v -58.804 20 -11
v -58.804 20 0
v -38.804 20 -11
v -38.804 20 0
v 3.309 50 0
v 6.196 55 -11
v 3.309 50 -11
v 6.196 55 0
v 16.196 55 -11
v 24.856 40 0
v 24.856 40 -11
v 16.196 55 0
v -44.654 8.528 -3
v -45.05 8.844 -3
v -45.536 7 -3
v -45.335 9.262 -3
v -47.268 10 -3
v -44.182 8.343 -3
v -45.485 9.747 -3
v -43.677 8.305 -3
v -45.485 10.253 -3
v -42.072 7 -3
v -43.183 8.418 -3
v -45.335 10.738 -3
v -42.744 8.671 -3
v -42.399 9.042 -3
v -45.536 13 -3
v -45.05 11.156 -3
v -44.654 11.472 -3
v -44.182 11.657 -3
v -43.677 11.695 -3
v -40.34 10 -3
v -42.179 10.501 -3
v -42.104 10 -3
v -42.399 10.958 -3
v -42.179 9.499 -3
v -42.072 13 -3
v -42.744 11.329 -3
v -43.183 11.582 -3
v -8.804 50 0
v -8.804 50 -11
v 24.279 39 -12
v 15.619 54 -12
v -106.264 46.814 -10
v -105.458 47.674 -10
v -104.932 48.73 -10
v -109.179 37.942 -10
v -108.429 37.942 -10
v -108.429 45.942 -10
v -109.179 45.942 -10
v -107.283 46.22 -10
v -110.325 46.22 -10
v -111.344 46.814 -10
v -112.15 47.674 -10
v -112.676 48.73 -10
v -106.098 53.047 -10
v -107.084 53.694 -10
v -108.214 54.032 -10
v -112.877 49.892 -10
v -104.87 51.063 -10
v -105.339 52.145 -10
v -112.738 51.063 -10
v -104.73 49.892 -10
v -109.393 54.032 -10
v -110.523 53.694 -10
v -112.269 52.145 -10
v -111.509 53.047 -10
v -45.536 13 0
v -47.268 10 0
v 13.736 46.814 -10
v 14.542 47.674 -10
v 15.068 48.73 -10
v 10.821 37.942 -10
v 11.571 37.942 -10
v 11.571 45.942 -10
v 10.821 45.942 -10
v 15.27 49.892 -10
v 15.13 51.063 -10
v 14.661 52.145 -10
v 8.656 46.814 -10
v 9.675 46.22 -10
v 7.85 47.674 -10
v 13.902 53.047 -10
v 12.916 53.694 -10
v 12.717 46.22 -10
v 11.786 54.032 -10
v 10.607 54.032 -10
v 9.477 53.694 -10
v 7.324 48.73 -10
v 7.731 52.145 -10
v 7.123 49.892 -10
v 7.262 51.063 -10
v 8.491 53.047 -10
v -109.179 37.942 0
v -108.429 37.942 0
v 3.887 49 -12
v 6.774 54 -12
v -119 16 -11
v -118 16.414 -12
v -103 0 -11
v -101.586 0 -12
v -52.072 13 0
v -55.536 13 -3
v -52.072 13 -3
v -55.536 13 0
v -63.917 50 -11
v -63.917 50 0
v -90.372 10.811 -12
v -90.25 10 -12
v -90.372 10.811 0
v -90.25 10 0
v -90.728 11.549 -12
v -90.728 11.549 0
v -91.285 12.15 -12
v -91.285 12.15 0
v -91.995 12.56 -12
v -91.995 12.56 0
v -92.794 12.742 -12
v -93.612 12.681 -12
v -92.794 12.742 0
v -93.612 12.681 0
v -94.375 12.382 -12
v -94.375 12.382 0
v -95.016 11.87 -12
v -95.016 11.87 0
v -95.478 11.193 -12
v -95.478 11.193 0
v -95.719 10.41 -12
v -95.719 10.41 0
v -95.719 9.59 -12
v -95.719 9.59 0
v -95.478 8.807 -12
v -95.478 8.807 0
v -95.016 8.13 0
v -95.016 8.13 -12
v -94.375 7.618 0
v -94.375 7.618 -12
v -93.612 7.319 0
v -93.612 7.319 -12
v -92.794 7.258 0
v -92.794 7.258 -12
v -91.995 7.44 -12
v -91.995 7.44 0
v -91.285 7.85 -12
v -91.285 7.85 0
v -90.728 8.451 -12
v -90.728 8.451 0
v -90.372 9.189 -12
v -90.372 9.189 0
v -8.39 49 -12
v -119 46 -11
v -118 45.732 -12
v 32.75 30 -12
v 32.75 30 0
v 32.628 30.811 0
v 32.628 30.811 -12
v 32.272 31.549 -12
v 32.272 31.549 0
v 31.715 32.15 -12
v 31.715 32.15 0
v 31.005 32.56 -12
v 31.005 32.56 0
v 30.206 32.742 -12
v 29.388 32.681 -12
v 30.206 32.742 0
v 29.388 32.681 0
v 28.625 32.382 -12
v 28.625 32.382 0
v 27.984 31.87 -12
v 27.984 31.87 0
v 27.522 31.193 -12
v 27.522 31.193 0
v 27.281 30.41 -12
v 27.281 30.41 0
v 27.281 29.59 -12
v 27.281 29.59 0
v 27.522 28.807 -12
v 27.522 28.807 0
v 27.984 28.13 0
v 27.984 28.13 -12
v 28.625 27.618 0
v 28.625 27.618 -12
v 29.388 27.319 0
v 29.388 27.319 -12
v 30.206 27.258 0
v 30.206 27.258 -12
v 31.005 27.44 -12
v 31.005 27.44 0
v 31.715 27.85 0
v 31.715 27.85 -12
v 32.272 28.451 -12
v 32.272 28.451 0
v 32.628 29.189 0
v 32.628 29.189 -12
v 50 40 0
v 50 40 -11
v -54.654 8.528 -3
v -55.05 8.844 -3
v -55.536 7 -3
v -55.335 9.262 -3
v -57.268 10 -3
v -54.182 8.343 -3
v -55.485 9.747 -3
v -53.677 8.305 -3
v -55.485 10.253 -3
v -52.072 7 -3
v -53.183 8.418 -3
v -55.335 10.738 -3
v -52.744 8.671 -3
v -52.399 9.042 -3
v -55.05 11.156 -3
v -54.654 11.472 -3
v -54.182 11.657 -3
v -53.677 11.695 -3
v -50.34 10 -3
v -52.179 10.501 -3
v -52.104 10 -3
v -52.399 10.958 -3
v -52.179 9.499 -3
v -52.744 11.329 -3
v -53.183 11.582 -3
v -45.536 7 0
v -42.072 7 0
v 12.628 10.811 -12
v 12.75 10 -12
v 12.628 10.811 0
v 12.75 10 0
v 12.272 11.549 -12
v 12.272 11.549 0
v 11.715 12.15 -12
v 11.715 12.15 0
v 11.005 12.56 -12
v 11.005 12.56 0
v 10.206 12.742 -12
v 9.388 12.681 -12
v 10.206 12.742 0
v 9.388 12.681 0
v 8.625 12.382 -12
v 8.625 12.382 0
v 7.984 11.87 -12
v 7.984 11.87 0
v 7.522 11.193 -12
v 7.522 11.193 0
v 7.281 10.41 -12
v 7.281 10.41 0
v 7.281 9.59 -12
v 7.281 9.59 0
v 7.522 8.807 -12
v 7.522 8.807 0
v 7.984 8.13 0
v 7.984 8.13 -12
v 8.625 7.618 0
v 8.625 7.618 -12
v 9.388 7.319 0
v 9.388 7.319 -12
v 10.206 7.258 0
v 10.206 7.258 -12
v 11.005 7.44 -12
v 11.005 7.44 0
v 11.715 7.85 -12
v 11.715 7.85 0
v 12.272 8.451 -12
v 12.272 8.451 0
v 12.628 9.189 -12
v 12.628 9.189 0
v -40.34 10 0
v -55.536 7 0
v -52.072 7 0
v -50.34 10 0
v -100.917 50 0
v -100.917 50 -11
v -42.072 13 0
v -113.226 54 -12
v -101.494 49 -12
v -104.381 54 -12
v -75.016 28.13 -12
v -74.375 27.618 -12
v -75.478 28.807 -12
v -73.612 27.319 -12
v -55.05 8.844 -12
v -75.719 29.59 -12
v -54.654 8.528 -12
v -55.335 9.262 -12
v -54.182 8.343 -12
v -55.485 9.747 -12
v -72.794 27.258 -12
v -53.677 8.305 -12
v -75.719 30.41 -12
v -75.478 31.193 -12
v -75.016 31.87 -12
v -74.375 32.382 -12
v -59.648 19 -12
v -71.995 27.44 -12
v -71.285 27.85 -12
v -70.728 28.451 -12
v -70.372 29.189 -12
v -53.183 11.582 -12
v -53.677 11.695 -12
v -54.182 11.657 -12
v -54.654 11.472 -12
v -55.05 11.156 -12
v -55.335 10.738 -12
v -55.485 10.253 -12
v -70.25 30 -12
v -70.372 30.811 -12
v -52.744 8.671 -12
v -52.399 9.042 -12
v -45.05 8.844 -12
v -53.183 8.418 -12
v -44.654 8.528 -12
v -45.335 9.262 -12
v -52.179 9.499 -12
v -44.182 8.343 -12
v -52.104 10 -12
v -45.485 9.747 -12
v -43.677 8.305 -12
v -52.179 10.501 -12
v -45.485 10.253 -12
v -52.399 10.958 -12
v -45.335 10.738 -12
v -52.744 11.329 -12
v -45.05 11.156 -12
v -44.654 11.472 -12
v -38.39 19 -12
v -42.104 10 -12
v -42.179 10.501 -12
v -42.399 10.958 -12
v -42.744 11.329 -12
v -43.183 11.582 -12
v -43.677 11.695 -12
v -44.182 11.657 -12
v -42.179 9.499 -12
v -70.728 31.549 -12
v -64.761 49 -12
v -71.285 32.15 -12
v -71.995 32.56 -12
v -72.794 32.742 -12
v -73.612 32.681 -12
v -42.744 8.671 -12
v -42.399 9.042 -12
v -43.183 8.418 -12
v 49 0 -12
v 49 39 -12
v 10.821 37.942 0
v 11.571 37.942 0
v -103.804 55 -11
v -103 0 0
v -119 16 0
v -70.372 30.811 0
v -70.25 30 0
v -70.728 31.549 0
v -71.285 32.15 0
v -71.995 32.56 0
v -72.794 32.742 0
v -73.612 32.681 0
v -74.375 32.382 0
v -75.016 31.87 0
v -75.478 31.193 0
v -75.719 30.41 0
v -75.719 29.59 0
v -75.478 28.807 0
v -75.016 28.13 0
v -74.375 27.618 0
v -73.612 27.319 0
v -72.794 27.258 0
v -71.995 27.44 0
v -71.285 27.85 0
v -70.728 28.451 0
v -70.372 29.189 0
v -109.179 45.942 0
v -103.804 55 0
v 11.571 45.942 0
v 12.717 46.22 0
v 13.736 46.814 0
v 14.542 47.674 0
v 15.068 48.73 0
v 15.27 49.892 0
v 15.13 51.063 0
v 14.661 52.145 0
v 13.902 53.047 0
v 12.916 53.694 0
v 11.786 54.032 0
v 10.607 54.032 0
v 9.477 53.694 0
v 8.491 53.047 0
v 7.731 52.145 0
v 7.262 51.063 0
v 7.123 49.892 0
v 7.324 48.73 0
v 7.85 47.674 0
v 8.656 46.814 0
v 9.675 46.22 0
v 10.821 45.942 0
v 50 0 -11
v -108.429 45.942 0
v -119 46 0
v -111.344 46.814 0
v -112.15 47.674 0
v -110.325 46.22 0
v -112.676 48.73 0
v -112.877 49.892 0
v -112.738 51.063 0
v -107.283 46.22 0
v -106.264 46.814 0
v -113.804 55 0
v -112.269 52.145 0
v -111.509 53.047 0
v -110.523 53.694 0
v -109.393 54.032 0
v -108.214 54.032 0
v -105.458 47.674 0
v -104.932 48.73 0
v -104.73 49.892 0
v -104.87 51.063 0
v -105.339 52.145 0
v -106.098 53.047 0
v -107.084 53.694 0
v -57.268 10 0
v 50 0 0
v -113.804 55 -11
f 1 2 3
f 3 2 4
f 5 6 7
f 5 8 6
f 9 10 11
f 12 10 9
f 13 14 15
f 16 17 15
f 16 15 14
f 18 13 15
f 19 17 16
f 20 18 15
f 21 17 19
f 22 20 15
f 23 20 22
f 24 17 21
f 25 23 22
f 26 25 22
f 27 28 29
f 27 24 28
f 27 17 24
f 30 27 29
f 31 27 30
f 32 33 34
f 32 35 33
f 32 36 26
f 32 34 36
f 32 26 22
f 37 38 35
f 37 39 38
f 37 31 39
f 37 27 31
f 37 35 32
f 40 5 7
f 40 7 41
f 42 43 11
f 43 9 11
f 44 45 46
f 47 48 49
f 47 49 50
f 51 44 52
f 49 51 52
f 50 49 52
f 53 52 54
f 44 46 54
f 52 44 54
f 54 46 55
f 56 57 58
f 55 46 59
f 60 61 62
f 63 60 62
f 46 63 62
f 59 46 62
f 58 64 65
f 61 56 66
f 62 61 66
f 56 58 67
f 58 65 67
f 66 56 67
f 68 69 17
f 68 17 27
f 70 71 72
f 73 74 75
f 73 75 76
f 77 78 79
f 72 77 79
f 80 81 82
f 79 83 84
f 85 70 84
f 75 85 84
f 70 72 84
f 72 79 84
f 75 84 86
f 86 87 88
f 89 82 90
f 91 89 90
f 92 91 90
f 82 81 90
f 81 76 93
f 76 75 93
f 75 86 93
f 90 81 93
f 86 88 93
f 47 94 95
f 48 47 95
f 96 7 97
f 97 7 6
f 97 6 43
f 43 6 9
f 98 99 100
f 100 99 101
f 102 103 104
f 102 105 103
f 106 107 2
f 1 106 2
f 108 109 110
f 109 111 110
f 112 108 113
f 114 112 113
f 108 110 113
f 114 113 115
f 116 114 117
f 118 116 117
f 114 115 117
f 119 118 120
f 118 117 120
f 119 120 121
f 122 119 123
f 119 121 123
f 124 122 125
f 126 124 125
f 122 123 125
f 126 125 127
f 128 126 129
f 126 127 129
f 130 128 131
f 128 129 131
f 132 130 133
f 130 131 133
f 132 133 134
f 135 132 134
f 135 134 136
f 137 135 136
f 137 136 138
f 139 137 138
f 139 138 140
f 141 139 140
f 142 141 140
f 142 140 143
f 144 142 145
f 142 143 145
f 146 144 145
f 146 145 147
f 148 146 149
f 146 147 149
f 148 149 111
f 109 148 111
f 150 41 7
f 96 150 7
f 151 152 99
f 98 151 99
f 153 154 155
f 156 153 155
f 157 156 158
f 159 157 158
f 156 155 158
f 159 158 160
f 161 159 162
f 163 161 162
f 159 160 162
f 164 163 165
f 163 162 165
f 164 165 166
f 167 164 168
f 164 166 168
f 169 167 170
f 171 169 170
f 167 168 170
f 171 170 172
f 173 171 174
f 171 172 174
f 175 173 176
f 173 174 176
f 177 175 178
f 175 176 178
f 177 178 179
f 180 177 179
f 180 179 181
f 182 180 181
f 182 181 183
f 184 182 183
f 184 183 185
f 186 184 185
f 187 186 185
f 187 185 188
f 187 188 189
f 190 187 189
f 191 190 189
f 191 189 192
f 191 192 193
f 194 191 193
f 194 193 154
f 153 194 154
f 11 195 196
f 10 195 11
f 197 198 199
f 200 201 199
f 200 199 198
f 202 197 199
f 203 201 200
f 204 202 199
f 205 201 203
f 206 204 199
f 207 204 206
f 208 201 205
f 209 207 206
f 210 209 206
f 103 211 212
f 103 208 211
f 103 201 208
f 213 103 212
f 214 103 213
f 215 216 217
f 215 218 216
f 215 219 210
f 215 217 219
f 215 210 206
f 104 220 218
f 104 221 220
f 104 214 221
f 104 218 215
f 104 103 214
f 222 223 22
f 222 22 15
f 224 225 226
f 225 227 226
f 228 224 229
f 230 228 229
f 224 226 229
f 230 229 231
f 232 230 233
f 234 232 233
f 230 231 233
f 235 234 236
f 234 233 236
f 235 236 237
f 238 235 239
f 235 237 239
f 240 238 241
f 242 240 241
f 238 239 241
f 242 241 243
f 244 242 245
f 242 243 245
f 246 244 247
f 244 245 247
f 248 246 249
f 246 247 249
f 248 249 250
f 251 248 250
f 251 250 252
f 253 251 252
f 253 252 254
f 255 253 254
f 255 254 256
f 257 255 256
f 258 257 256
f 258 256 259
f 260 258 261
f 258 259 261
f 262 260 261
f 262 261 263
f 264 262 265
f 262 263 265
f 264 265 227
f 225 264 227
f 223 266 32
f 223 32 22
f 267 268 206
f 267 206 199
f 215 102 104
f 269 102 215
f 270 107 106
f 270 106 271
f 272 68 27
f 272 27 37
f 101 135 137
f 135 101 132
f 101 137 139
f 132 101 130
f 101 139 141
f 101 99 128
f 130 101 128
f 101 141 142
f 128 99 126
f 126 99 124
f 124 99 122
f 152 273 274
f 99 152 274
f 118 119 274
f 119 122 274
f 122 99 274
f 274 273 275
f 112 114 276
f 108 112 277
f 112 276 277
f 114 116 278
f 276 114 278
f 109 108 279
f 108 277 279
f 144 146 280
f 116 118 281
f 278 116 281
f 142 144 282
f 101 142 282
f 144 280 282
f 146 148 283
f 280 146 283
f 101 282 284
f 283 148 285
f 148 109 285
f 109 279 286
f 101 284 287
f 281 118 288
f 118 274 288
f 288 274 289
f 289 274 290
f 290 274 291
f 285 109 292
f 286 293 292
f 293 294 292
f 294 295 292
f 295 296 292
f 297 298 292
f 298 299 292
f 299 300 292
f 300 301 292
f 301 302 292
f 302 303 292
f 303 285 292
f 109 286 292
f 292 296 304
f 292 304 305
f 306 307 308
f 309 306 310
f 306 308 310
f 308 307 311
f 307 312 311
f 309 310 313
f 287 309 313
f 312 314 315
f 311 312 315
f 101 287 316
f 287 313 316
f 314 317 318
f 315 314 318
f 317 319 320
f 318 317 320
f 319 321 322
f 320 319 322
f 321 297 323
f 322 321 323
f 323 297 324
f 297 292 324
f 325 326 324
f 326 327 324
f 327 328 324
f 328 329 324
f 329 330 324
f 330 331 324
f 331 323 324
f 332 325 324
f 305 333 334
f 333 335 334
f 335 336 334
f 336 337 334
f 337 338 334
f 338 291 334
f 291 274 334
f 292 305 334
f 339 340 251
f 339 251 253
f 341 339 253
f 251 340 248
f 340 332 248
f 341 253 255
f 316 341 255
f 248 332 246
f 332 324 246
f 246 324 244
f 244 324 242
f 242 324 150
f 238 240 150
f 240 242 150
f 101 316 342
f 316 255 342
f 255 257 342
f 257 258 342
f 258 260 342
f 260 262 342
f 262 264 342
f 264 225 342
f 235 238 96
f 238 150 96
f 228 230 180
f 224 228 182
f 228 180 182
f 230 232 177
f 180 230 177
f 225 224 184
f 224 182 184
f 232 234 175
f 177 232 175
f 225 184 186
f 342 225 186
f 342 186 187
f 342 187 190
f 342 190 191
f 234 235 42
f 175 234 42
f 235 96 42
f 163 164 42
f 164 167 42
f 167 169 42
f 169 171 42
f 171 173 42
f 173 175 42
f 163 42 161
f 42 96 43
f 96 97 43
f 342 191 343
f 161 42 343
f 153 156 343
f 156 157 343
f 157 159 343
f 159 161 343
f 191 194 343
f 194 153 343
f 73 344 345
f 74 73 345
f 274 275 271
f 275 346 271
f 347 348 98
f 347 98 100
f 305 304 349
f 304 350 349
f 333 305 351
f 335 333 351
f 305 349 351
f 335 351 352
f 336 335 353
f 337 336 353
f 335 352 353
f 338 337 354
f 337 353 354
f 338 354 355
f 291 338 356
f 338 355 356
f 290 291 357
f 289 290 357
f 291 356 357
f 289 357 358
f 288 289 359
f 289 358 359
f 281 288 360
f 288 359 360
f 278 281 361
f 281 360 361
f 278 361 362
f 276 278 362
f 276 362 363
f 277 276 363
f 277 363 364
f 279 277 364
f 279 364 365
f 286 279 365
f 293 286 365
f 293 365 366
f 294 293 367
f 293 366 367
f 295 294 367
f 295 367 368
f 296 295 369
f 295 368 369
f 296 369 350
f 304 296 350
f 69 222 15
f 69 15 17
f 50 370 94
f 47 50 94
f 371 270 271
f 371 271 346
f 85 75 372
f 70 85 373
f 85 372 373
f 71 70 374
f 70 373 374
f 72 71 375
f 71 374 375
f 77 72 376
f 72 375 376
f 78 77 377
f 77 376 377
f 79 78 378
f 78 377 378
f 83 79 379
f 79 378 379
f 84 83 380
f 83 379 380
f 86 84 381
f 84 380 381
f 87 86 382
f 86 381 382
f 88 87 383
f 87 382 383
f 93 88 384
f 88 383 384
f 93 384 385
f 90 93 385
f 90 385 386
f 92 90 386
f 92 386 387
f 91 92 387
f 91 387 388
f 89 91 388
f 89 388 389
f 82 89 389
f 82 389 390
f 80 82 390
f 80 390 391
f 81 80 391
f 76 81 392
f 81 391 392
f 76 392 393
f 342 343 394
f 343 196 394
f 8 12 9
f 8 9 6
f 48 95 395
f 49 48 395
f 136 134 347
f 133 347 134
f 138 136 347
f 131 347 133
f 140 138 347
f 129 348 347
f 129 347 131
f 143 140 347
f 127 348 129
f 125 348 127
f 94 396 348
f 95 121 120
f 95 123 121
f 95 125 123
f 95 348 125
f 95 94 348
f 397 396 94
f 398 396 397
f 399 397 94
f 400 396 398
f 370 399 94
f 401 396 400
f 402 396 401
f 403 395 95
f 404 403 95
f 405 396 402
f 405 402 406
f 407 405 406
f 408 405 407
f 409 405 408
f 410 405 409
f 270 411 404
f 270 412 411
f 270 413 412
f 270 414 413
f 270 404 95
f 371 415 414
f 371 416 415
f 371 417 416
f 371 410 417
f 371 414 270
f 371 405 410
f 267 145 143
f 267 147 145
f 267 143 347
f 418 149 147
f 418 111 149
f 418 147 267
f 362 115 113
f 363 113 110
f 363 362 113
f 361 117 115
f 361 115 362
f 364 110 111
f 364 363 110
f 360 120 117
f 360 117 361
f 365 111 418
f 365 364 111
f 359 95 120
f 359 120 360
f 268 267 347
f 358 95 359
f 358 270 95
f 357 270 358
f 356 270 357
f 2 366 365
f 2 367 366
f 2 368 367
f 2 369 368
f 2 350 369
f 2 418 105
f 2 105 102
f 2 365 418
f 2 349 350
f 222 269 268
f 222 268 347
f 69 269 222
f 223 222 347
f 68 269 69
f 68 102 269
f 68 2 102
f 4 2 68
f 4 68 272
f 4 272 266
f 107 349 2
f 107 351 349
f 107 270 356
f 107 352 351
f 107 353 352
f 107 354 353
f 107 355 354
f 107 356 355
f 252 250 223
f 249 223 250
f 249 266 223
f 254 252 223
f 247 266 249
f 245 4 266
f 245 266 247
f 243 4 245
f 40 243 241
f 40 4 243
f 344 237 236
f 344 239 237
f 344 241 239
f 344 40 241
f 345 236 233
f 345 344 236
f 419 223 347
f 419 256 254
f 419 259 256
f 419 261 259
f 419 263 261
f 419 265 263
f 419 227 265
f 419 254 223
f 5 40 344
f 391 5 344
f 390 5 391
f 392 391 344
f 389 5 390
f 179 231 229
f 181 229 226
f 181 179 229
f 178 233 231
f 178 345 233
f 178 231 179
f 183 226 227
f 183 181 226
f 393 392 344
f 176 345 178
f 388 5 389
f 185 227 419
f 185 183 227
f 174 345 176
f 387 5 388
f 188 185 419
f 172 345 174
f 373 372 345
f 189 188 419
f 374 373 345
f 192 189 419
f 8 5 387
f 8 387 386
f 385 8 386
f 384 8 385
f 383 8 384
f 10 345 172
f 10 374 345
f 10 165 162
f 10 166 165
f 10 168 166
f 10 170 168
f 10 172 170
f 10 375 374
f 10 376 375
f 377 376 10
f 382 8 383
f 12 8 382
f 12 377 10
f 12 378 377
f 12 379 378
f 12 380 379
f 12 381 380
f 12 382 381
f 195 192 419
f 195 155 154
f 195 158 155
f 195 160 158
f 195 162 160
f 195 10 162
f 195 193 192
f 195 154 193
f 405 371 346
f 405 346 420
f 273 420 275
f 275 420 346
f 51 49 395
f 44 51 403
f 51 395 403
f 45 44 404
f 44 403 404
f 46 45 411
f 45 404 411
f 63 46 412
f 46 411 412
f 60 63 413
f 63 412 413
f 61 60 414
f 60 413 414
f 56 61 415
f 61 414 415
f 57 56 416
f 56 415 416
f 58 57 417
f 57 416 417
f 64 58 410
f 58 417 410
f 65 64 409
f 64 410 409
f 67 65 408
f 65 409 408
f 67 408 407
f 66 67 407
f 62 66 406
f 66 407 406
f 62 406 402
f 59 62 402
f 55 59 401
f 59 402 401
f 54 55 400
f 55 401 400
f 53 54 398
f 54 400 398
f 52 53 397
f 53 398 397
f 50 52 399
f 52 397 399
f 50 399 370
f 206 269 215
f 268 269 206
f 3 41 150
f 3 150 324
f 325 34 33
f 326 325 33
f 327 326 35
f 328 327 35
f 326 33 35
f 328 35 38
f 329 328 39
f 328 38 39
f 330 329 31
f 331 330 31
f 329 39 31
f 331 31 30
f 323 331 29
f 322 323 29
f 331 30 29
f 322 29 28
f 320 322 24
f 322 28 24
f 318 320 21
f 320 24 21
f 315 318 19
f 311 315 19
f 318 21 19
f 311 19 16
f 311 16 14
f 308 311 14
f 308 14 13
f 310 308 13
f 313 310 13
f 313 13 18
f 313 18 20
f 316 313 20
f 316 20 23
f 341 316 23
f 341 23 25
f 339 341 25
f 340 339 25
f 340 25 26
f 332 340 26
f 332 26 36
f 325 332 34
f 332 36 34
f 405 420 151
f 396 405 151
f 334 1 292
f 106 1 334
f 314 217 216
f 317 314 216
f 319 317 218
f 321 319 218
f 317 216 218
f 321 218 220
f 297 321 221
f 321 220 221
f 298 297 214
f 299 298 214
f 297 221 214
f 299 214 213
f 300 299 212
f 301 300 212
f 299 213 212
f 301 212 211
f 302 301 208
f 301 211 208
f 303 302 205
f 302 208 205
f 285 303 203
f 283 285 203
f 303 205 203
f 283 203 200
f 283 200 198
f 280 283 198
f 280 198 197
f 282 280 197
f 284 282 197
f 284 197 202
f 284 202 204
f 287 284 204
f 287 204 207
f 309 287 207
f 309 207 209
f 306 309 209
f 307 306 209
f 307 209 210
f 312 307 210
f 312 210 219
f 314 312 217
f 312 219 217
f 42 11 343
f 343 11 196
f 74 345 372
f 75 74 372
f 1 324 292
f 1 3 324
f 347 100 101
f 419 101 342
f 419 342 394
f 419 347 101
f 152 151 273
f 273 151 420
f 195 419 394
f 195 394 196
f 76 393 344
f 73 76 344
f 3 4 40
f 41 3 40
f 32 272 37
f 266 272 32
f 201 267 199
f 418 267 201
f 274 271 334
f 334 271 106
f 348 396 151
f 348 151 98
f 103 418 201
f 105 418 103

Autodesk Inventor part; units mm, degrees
ref_plane "YZ Plane" through (0, 0, 0) normal (1, 0, 0) x (0, 1, 0)
ref_plane "XZ Plane" through (0, 0, 0) normal (0, 1, 0) x (-1, 0, 0)
ref_plane "XY Plane" through (0, 0, 0) normal (0, 0, 1) x (1, 0, 0)
sketch "v_slot_locations" plane through (0, 0, 0) normal (0, 0, 1) x (1, 0, 0)
  circle A0 centre (10, 10) radius 2.3 construction
  line L0 (13.9, 12.8393) -> (13.9, 7.1607) construction
  line L1 (12.8393, 13.9) -> (13.9, 12.8393) construction
  line L2 (7.1607, 13.9) -> (12.8393, 13.9) construction
  line L3 (3.7607, 17.3) -> (7.1607, 13.9) construction
  line L4 (1.8, 17.3) -> (3.7607, 17.3) construction
  line L5 (1.8, 22.7) -> (1.8, 17.3) construction
  line L6 (17.3, 1.8) -> (22.7, 1.8) construction
  line L7 (17.3, 3.7607) -> (17.3, 1.8) construction
  line L8 (13.9, 7.1607) -> (17.3, 3.7607) construction
  line L9 (0, 14.58) -> (0, 25.42) construction
  line L10 (1.185, 13.395) -> (0, 14.58) construction
  line L11 (1.8, 13.395) -> (1.185, 13.395) construction
  line L12 (1.8, 15.5) -> (1.8, 13.395) construction
  line L13 (3.4393, 15.5) -> (1.8, 15.5) construction
  line L14 (6.1, 12.8393) -> (3.4393, 15.5) construction
  line L15 (6.1, 10.21) -> (6.1, 12.8393) construction
  line L16 (6.31, 10) -> (6.1, 10.21) construction
  line L17 (6.1, 9.79) -> (6.31, 10) construction
  line L18 (6.1, 7.1607) -> (6.1, 9.79) construction
  line L19 (3.4393, 4.5) -> (6.1, 7.1607) construction
  line L20 (1.8, 4.5) -> (3.4393, 4.5) construction
  line L21 (1.8, 6.605) -> (1.8, 4.5) construction
  line L22 (1.185, 6.605) -> (1.8, 6.605) construction
  line L23 (0, 5.42) -> (1.185, 6.605) construction
  line L24 (0, 1.5) -> (0, 5.42) construction
  arc A1 (0, 1.5) -> (1.5, 0) centre (1.5, 1.5) ccw construction
  line L25 (5.42, 0) -> (1.5, 0) construction
  line L26 (6.605, 1.185) -> (5.42, 0) construction
  line L27 (6.605, 1.8) -> (6.605, 1.185) construction
  line L28 (4.5, 1.8) -> (6.605, 1.8) construction
  line L29 (4.5, 3.4393) -> (4.5, 1.8) construction
  line L30 (7.1607, 6.1) -> (4.5, 3.4393) construction
  line L31 (9.79, 6.1) -> (7.1607, 6.1) construction
  line L32 (10, 6.31) -> (9.79, 6.1) construction
  line L33 (10.21, 6.1) -> (10, 6.31) construction
  line L34 (12.8393, 6.1) -> (10.21, 6.1) construction
  line L35 (15.5, 3.4393) -> (12.8393, 6.1) construction
  line L36 (15.5, 1.8) -> (15.5, 3.4393) construction
  line L37 (13.395, 1.8) -> (15.5, 1.8) construction
  line L38 (13.395, 1.185) -> (13.395, 1.8) construction
  line L39 (14.58, 0) -> (13.395, 1.185) construction
  line L40 (25.42, 0) -> (14.58, 0) construction
  line L41 (0, 1.5) -> (0, 0) construction
  line L42 (0, 0) -> (1.5, 0) construction
  line L43 (0, 20) -> (40, 20) construction
  line L44 (20, 0) -> (20, 40) construction
  line L45 (33.9, 10.21) -> (33.9, 12.8393) construction
  line L46 (32.8393, 13.9) -> (27.1607, 13.9) construction
  line L47 (33.69, 10) -> (33.9, 10.21) construction
  line L48 (33.9, 9.79) -> (33.69, 10) construction
  line L49 (27.1607, 13.9) -> (26.1, 12.8393) construction
  line L50 (33.9, 7.1607) -> (33.9, 9.79) construction
  circle A2 centre (30, 10) radius 2.3 construction
  line L51 (30.21, 6.1) -> (32.8393, 6.1) construction
  line L52 (26.1, 12.8393) -> (26.1, 7.1607) construction
  line L53 (30, 6.31) -> (30.21, 6.1) construction
  line L54 (29.79, 6.1) -> (30, 6.31) construction
  line L55 (27.1607, 6.1) -> (29.79, 6.1) construction
  line L56 (33.9, 12.8393) -> (36.5607, 15.5) construction
  line L57 (38.2, 13.395) -> (38.815, 13.395) construction
  line L58 (36.2393, 17.3) -> (32.8393, 13.9) construction
  line L59 (38.2, 15.5) -> (38.2, 13.395) construction
  line L60 (38.815, 13.395) -> (40, 14.58) construction
  line L61 (38.2, 17.3) -> (36.2393, 17.3) construction
  line L62 (38.2, 22.7) -> (38.2, 17.3) construction
  line L63 (40, 14.58) -> (40, 25.42) construction
  line L64 (36.5607, 15.5) -> (38.2, 15.5) construction
  line L65 (38.815, 6.605) -> (38.2, 6.605) construction
  line L66 (40, 5.42) -> (38.815, 6.605) construction
  line L67 (36.5607, 4.5) -> (33.9, 7.1607) construction
  line L68 (38.2, 6.605) -> (38.2, 4.5) construction
  line L69 (38.2, 4.5) -> (36.5607, 4.5) construction
  line L70 (32.8393, 6.1) -> (35.5, 3.4393) construction
  line L71 (40, 1.5) -> (40, 5.42) construction
  line L72 (35.5, 3.4393) -> (35.5, 1.8) construction
  line L73 (35.5, 1.8) -> (33.395, 1.8) construction
  line L74 (33.395, 1.8) -> (33.395, 1.185) construction
  line L75 (33.395, 1.185) -> (34.58, 0) construction
  line L76 (34.58, 0) -> (38.5, 0) construction
  arc A3 (38.5, 0) -> (40, 1.5) centre (38.5, 1.5) ccw construction
  line L77 (22.7, 3.7607) -> (22.7, 1.8) construction
  line L78 (26.1, 7.1607) -> (22.7, 3.7607) construction
  line L79 (25.42, 0) -> (26.605, 1.185) construction
  line L80 (24.5, 3.4393) -> (27.1607, 6.1) construction
  line L81 (24.5, 1.8) -> (24.5, 3.4393) construction
  line L82 (26.605, 1.8) -> (24.5, 1.8) construction
  line L83 (26.605, 1.185) -> (26.605, 1.8) construction
  line L84 (6.1, 29.79) -> (6.1, 27.1607) construction
  line L85 (7.1607, 26.1) -> (12.8393, 26.1) construction
  line L86 (6.31, 30) -> (6.1, 29.79) construction
  line L87 (6.1, 30.21) -> (6.31, 30) construction
  line L88 (12.8393, 26.1) -> (13.9, 27.1607) construction
  line L89 (6.1, 32.8393) -> (6.1, 30.21) construction
  circle A4 centre (10, 30) radius 2.3 construction
  line L90 (9.79, 33.9) -> (7.1607, 33.9) construction
  line L91 (13.9, 27.1607) -> (13.9, 32.8393) construction
  line L92 (10, 33.69) -> (9.79, 33.9) construction
  line L93 (10.21, 33.9) -> (10, 33.69) construction
  line L94 (12.8393, 33.9) -> (10.21, 33.9) construction
  line L95 (6.1, 27.1607) -> (3.4393, 24.5) construction
  line L96 (1.8, 26.605) -> (1.185, 26.605) construction
  line L97 (3.7607, 22.7) -> (7.1607, 26.1) construction
  line L98 (1.8, 24.5) -> (1.8, 26.605) construction
  line L99 (1.185, 26.605) -> (0, 25.42) construction
  line L100 (1.8, 22.7) -> (3.7607, 22.7) construction
  line L101 (3.4393, 24.5) -> (1.8, 24.5) construction
  line L102 (1.185, 33.395) -> (1.8, 33.395) construction
  line L103 (0, 34.58) -> (1.185, 33.395) construction
  line L104 (3.4393, 35.5) -> (6.1, 32.8393) construction
  line L105 (1.8, 33.395) -> (1.8, 35.5) construction
  line L106 (1.8, 35.5) -> (3.4393, 35.5) construction
  line L107 (7.1607, 33.9) -> (4.5, 36.5607) construction
  line L108 (0, 38.5) -> (0, 34.58) construction
  line L109 (4.5, 36.5607) -> (4.5, 38.2) construction
  line L110 (4.5, 38.2) -> (6.605, 38.2) construction
  line L111 (6.605, 38.2) -> (6.605, 38.815) construction
  line L112 (6.605, 38.815) -> (5.42, 40) construction
  line L113 (5.42, 40) -> (1.5, 40) construction
  arc A5 (1.5, 40) -> (0, 38.5) centre (1.5, 38.5) ccw construction
  line L114 (17.3, 38.2) -> (22.7, 38.2) construction
  line L115 (17.3, 36.2393) -> (17.3, 38.2) construction
  line L116 (13.9, 32.8393) -> (17.3, 36.2393) construction
  line L117 (14.58, 40) -> (13.395, 38.815) construction
  line L118 (15.5, 36.5607) -> (12.8393, 33.9) construction
  line L119 (15.5, 38.2) -> (15.5, 36.5607) construction
  line L120 (13.395, 38.2) -> (15.5, 38.2) construction
  line L121 (25.42, 40) -> (14.58, 40) construction
  line L122 (13.395, 38.815) -> (13.395, 38.2) construction
  line L123 (38.815, 26.605) -> (40, 25.42) construction
  line L124 (38.2, 26.605) -> (38.815, 26.605) construction
  line L125 (38.2, 24.5) -> (38.2, 26.605) construction
  line L126 (36.5607, 24.5) -> (38.2, 24.5) construction
  line L127 (38.2, 22.7) -> (36.2393, 22.7) construction
  line L128 (36.2393, 22.7) -> (32.8393, 26.1) construction
  line L129 (33.9, 27.1607) -> (36.5607, 24.5) construction
  line L130 (33.9, 29.79) -> (33.9, 27.1607) construction
  line L131 (32.8393, 26.1) -> (27.1607, 26.1) construction
  circle A6 centre (30, 30) radius 2.3 construction
  line L132 (33.9, 30.21) -> (33.69, 30) construction
  line L133 (33.69, 30) -> (33.9, 29.79) construction
  line L134 (33.9, 32.8393) -> (33.9, 30.21) construction
  line L135 (38.815, 33.395) -> (38.2, 33.395) construction
  line L136 (40, 34.58) -> (38.815, 33.395) construction
  line L137 (40, 38.5) -> (40, 34.58) construction
  line L138 (38.2, 33.395) -> (38.2, 35.5) construction
  line L139 (38.2, 35.5) -> (36.5607, 35.5) construction
  arc A7 (40, 38.5) -> (38.5, 40) centre (38.5, 38.5) ccw construction
  line L140 (34.58, 40) -> (38.5, 40) construction
  line L141 (33.395, 38.815) -> (34.58, 40) construction
  line L142 (33.395, 38.2) -> (33.395, 38.815) construction
  line L143 (35.5, 38.2) -> (33.395, 38.2) construction
  line L144 (35.5, 36.5607) -> (35.5, 38.2) construction
  line L145 (32.8393, 33.9) -> (35.5, 36.5607) construction
  line L146 (36.5607, 35.5) -> (33.9, 32.8393) construction
  line L147 (30.21, 33.9) -> (32.8393, 33.9) construction
  line L148 (29.79, 33.9) -> (30, 33.69) construction
  line L149 (30, 33.69) -> (30.21, 33.9) construction
  line L150 (27.1607, 33.9) -> (29.79, 33.9) construction
  line L151 (24.5, 36.5607) -> (27.1607, 33.9) construction
  line L152 (26.605, 38.815) -> (26.605, 38.2) construction
  line L153 (25.42, 40) -> (26.605, 38.815) construction
  line L154 (26.605, 38.2) -> (24.5, 38.2) construction
  line L155 (24.5, 38.2) -> (24.5, 36.5607) construction
  line L156 (22.7, 36.2393) -> (22.7, 38.2) construction
  line L157 (26.1, 32.8393) -> (22.7, 36.2393) construction
  line L158 (26.1, 27.1607) -> (26.1, 32.8393) construction
  line L159 (27.1607, 26.1) -> (26.1, 27.1607) construction
  line L160 (-96.9, 10.21) -> (-96.9, 12.8393) construction
  line L161 (-95.8393, 13.9) -> (-90.1607, 13.9) construction
  line L162 (-96.69, 10) -> (-96.9, 10.21) construction
  line L163 (-96.9, 9.79) -> (-96.69, 10) construction
  line L164 (-90.1607, 13.9) -> (-89.1, 12.8393) construction
  line L165 (-96.9, 7.1607) -> (-96.9, 9.79) construction
  circle A8 centre (-93, 10) radius 2.3 construction
  line L166 (-93.21, 6.1) -> (-95.8393, 6.1) construction
  line L167 (-89.1, 12.8393) -> (-89.1, 7.1607) construction
  line L168 (-93, 6.31) -> (-93.21, 6.1) construction
  line L169 (-92.79, 6.1) -> (-93, 6.31) construction
  line L170 (-90.1607, 6.1) -> (-92.79, 6.1) construction
  line L171 (-96.9, 12.8393) -> (-99.5607, 15.5) construction
  line L172 (-101.2, 13.395) -> (-101.815, 13.395) construction
  line L173 (-99.2393, 17.3) -> (-95.8393, 13.9) construction
  line L174 (-101.2, 15.5) -> (-101.2, 13.395) construction
  line L175 (-101.815, 13.395) -> (-103, 14.58) construction
  line L176 (-101.2, 17.3) -> (-99.2393, 17.3) construction
  line L177 (-101.2, 22.7) -> (-101.2, 17.3) construction
  line L178 (-103, 14.58) -> (-103, 25.42) construction
  line L179 (-99.5607, 15.5) -> (-101.2, 15.5) construction
  line L180 (-101.815, 6.605) -> (-101.2, 6.605) construction
  line L181 (-103, 5.42) -> (-101.815, 6.605) construction
  line L182 (-99.5607, 4.5) -> (-96.9, 7.1607) construction
  line L183 (-101.2, 6.605) -> (-101.2, 4.5) construction
  line L184 (-101.2, 4.5) -> (-99.5607, 4.5) construction
  line L185 (-95.8393, 6.1) -> (-98.5, 3.4393) construction
  line L186 (-103, 1.5) -> (-103, 5.42) construction
  line L187 (-98.5, 3.4393) -> (-98.5, 1.8) construction
  line L188 (-98.5, 1.8) -> (-96.395, 1.8) construction
  line L189 (-96.395, 1.8) -> (-96.395, 1.185) construction
  line L190 (-96.395, 1.185) -> (-97.58, 0) construction
  line L191 (-97.58, 0) -> (-101.5, 0) construction
  arc A9 (-103, 1.5) -> (-101.5, 0) centre (-101.5, 1.5) ccw construction
  line L192 (-85.7, 1.8) -> (-80.3, 1.8) construction
  line L193 (-85.7, 3.7607) -> (-85.7, 1.8) construction
  line L194 (-89.1, 7.1607) -> (-85.7, 3.7607) construction
  line L195 (-88.42, 0) -> (-89.605, 1.185) construction
  line L196 (-87.5, 3.4393) -> (-90.1607, 6.1) construction
  line L197 (-87.5, 1.8) -> (-87.5, 3.4393) construction
  line L198 (-89.605, 1.8) -> (-87.5, 1.8) construction
  line L199 (-77.58, 0) -> (-88.42, 0) construction
  line L200 (-89.605, 1.185) -> (-89.605, 1.8) construction
  line L201 (-103, 1.5) -> (-103, 0) construction
  line L202 (-103, 0) -> (-101.5, 0) construction
  line L203 (-103, 20) -> (-63, 20) construction
  line L204 (-83, 0) -> (-83, 40) construction
  line L205 (-64.185, 13.395) -> (-63, 14.58) construction
  line L206 (-64.8, 13.395) -> (-64.185, 13.395) construction
  line L207 (-64.8, 15.5) -> (-64.8, 13.395) construction
  line L208 (-66.4393, 15.5) -> (-64.8, 15.5) construction
  line L209 (-64.8, 17.3) -> (-66.7607, 17.3) construction
  line L210 (-66.7607, 17.3) -> (-70.1607, 13.9) construction
  line L211 (-69.1, 12.8393) -> (-66.4393, 15.5) construction
  line L212 (-69.1, 10.21) -> (-69.1, 12.8393) construction
  line L213 (-70.1607, 13.9) -> (-75.8393, 13.9) construction
  circle A10 centre (-73, 10) radius 2.3 construction
  line L214 (-69.1, 9.79) -> (-69.31, 10) construction
  line L215 (-69.31, 10) -> (-69.1, 10.21) construction
  line L216 (-69.1, 7.1607) -> (-69.1, 9.79) construction
  line L217 (-64.185, 6.605) -> (-64.8, 6.605) construction
  line L218 (-63, 5.42) -> (-64.185, 6.605) construction
  line L219 (-63, 1.5) -> (-63, 5.42) construction
  line L220 (-64.8, 6.605) -> (-64.8, 4.5) construction
  line L221 (-64.8, 4.5) -> (-66.4393, 4.5) construction
  arc A11 (-64.5, 0) -> (-63, 1.5) centre (-64.5, 1.5) ccw construction
  line L222 (-68.42, 0) -> (-64.5, 0) construction
  line L223 (-69.605, 1.185) -> (-68.42, 0) construction
  line L224 (-69.605, 1.8) -> (-69.605, 1.185) construction
  line L225 (-67.5, 1.8) -> (-69.605, 1.8) construction
  line L226 (-67.5, 3.4393) -> (-67.5, 1.8) construction
  line L227 (-70.1607, 6.1) -> (-67.5, 3.4393) construction
  line L228 (-66.4393, 4.5) -> (-69.1, 7.1607) construction
  line L229 (-72.79, 6.1) -> (-70.1607, 6.1) construction
  line L230 (-73.21, 6.1) -> (-73, 6.31) construction
  line L231 (-73, 6.31) -> (-72.79, 6.1) construction
  line L232 (-75.8393, 6.1) -> (-73.21, 6.1) construction
  line L233 (-78.5, 3.4393) -> (-75.8393, 6.1) construction
  line L234 (-76.395, 1.185) -> (-76.395, 1.8) construction
  line L235 (-77.58, 0) -> (-76.395, 1.185) construction
  line L236 (-76.395, 1.8) -> (-78.5, 1.8) construction
  line L237 (-78.5, 1.8) -> (-78.5, 3.4393) construction
  line L238 (-80.3, 3.7607) -> (-80.3, 1.8) construction
  line L239 (-76.9, 7.1607) -> (-80.3, 3.7607) construction
  line L240 (-76.9, 12.8393) -> (-76.9, 7.1607) construction
  line L241 (-75.8393, 13.9) -> (-76.9, 12.8393) construction
  line L242 (-63, 14.58) -> (-63, 25.42) construction
  line L243 (-64.8, 22.7) -> (-64.8, 17.3) construction
  line L244 (-80.3, 36.2393) -> (-80.3, 38.2) construction
  line L245 (-78.5, 38.2) -> (-78.5, 36.5607) construction
  line L246 (-77.58, 40) -> (-76.395, 38.815) construction
  line L247 (-76.395, 38.815) -> (-76.395, 38.2) construction
  line L248 (-76.395, 38.2) -> (-78.5, 38.2) construction
  line L249 (-76.9, 32.8393) -> (-80.3, 36.2393) construction
  line L250 (-78.5, 36.5607) -> (-75.8393, 33.9) construction
  line L251 (-70.1607, 26.1) -> (-75.8393, 26.1) construction
  circle A12 centre (-73, 30) radius 2.3 construction
  line L252 (-72.79, 33.9) -> (-70.1607, 33.9) construction
  line L253 (-73, 33.69) -> (-72.79, 33.9) construction
  line L254 (-73.21, 33.9) -> (-73, 33.69) construction
  line L255 (-75.8393, 33.9) -> (-73.21, 33.9) construction
  line L256 (-76.9, 27.1607) -> (-76.9, 32.8393) construction
  line L257 (-75.8393, 26.1) -> (-76.9, 27.1607) construction
  line L258 (-63, 38.5) -> (-63, 34.58) construction
  line L259 (-67.5, 36.5607) -> (-67.5, 38.2) construction
  line L260 (-67.5, 38.2) -> (-69.605, 38.2) construction
  line L261 (-69.605, 38.2) -> (-69.605, 38.815) construction
  arc A13 (-63, 38.5) -> (-64.5, 40) centre (-64.5, 38.5) ccw construction
  line L262 (-68.42, 40) -> (-64.5, 40) construction
  line L263 (-69.605, 38.815) -> (-68.42, 40) construction
  line L264 (-69.1, 32.8393) -> (-69.1, 30.21) construction
  line L265 (-64.185, 33.395) -> (-64.8, 33.395) construction
  line L266 (-63, 34.58) -> (-64.185, 33.395) construction
  line L267 (-66.4393, 35.5) -> (-69.1, 32.8393) construction
  line L268 (-64.8, 35.5) -> (-66.4393, 35.5) construction
  line L269 (-64.8, 33.395) -> (-64.8, 35.5) construction
  line L270 (-70.1607, 33.9) -> (-67.5, 36.5607) construction
  line L271 (-64.8, 22.7) -> (-66.7607, 22.7) construction
  line L272 (-66.7607, 22.7) -> (-70.1607, 26.1) construction
  line L273 (-69.31, 30) -> (-69.1, 29.79) construction
  line L274 (-69.1, 30.21) -> (-69.31, 30) construction
  line L275 (-69.1, 29.79) -> (-69.1, 27.1607) construction
  line L276 (-69.1, 27.1607) -> (-66.4393, 24.5) construction
  line L277 (-66.4393, 24.5) -> (-64.8, 24.5) construction
  line L278 (-64.8, 24.5) -> (-64.8, 26.605) construction
  line L279 (-64.185, 26.605) -> (-63, 25.42) construction
  line L280 (-64.8, 26.605) -> (-64.185, 26.605) construction
  line L281 (-95.8393, 26.1) -> (-90.1607, 26.1) construction
  line L282 (-90.1607, 26.1) -> (-89.1, 27.1607) construction
  line L283 (-96.9, 29.79) -> (-96.9, 27.1607) construction
  line L284 (-96.69, 30) -> (-96.9, 29.79) construction
  circle A14 centre (-93, 30) radius 2.3 construction
  line L285 (-89.1, 27.1607) -> (-89.1, 32.8393) construction
  line L286 (-92.79, 33.9) -> (-93, 33.69) construction
  line L287 (-90.1607, 33.9) -> (-92.79, 33.9) construction
  line L288 (-96.9, 30.21) -> (-96.69, 30) construction
  line L289 (-93, 33.69) -> (-93.21, 33.9) construction
  line L290 (-96.9, 32.8393) -> (-96.9, 30.21) construction
  line L291 (-96.9, 27.1607) -> (-99.5607, 24.5) construction
  line L292 (-99.2393, 22.7) -> (-95.8393, 26.1) construction
  line L293 (-87.5, 36.5607) -> (-90.1607, 33.9) construction
  line L294 (-89.1, 32.8393) -> (-85.7, 36.2393) construction
  line L295 (-98.5, 38.2) -> (-96.395, 38.2) construction
  line L296 (-96.395, 38.2) -> (-96.395, 38.815) construction
  line L297 (-96.395, 38.815) -> (-97.58, 40) construction
  line L298 (-101.2, 35.5) -> (-99.5607, 35.5) construction
  line L299 (-98.5, 36.5607) -> (-98.5, 38.2) construction
  line L300 (-97.58, 40) -> (-101.5, 40) construction
  line L301 (-101.2, 33.395) -> (-101.2, 35.5) construction
  line L302 (-103, 34.58) -> (-101.815, 33.395) construction
  line L303 (-101.815, 33.395) -> (-101.2, 33.395) construction
  line L304 (-95.8393, 33.9) -> (-98.5, 36.5607) construction
  line L305 (-99.5607, 35.5) -> (-96.9, 32.8393) construction
  line L306 (-93.21, 33.9) -> (-95.8393, 33.9) construction
  line L307 (-103, 38.5) -> (-103, 34.58) construction
  arc A15 (-101.5, 40) -> (-103, 38.5) centre (-101.5, 38.5) ccw construction
  line L308 (-89.605, 38.815) -> (-89.605, 38.2) construction
  line L309 (-88.42, 40) -> (-89.605, 38.815) construction
  line L310 (-89.605, 38.2) -> (-87.5, 38.2) construction
  line L311 (-87.5, 38.2) -> (-87.5, 36.5607) construction
  line L312 (-77.58, 40) -> (-88.42, 40) construction
  line L313 (-85.7, 36.2393) -> (-85.7, 38.2) construction
  line L314 (-85.7, 38.2) -> (-80.3, 38.2) construction
  line L315 (-101.2, 26.605) -> (-101.815, 26.605) construction
  line L316 (-101.815, 26.605) -> (-103, 25.42) construction
  line L317 (-101.2, 24.5) -> (-101.2, 26.605) construction
  line L318 (-99.5607, 24.5) -> (-101.2, 24.5) construction
  line L319 (-101.2, 22.7) -> (-99.2393, 22.7) construction
  point P0 (0, 0)
  dimension "d3" = 1.5
  dimension "d4" = 4.6
  dimension "d5" = 1.5
  dimension "d7" = 45
  dimension "d8" = 2.105
  dimension "d9" = 1.6393
  dimension "d10" = 1.185
  dimension "d11" = 45
  dimension "d12" = 0.615
  dimension "d13" = 45
  dimension "d16" = 135
  dimension "d17" = 135
  dimension "d18" = 45
  dimension "d19" = 1.5
  dimension "d20" = 2.6293
  dimension "d21" = 2.6293
  dimension "d23" = 45
  dimension "d24" = 2.105
  dimension "d25" = 10.84
  dimension "d26" = 135
  dimension "d27" = 135
  dimension "d28" = 2.6607
  dimension "d29" = 45
  dimension "d30" = 1.185
  dimension "d33" = 0.21
  dimension "d34" = 1.5
  dimension "d35" = 3.9
  dimension "d36" = 3.9
  dimension "d37" = 135
  dimension "d38" = 1.0607
  dimension "d39" = 1.185
  dimension "d40" = 0.615
  dimension "d41" = 1.6393
  dimension "d42" = 1.8
  dimension "d43" = 0.21
  dimension "d44" = 135
  dimension "d45" = 5.4
  dimension "d46" = 1.9607
  dimension "d47" = 1.8
  dimension "d49" = 5.4
  dimension "d50" = 1.8
  dimension "d51" = 40
  dimension "d52" = 40
  dimension "d98" = 13.395
  dimension "d99" = 10
  dimension "d100" = 10
  dimension "d101" = 6.605
  dimension "d102" = 10
  dimension "d103" = 13.395
  dimension "d104" = 1.5
  dimension "d105" = 4.6
  dimension "d106" = 1.5
  dimension "d107" = 45
  dimension "d108" = 2.105
  dimension "d109" = 1.6393
  dimension "d110" = 1.185
  dimension "d111" = 45
  dimension "d112" = 0.615
  dimension "d113" = 45
  dimension "d114" = 135
  dimension "d115" = 135
  dimension "d116" = 45
  dimension "d117" = 1.5
  dimension "d118" = 2.6293
sketch "Sketch2" plane through (0, 0, 0) normal (0, 0, 1) x (1, 0, 0)
  line L0 (-103, 0) -> (50, 0)
  line L1 (50, 0) -> (50, 40)
  line L2 (50, 40) -> (24.8564, 40)
  line L3 (24.8564, 40) -> (16.1962, 55)
  line L4 (16.1962, 55) -> (6.1962, 55)
  line L5 (6.1962, 55) -> (3.3094, 50)
  line L6 (3.3094, 50) -> (-100.9171, 50)
  line L7 (-100.9171, 50) -> (-103.8038, 55)
  line L8 (-103.8038, 55) -> (-113.8038, 55)
  line L9 (-113.8038, 55) -> (-119, 46)
  line L10 (-119, 46) -> (-119, 16)
  line L11 (-119, 16) -> (-103, 0)
  line L12 (-152.8, 0) -> (83.8, 0) projected
  circle A0 centre (-73, 30) radius 2.3 construction
  circle A1 centre (-93, 10) radius 2.3 construction
  circle A2 centre (10, 10) radius 2.3 construction
  circle A3 centre (30, 30) radius 2.3 construction
  arc A4 (-108.4288, 45.9423) -> (-109.1788, 45.9423) centre (-108.8038, 50) ccw
  arc A5 (11.5712, 45.9423) -> (10.8212, 45.9423) centre (11.1962, 50) ccw
  line L13 (-108.8038, 55) -> (-108.8038, 50) construction
  line L14 (11.1962, 55) -> (11.1962, 50) construction
  line L15 (-109.1788, 45.9423) -> (-109.1788, 37.9423)
  line L16 (-109.1788, 37.9423) -> (-108.4288, 37.9423)
  line L17 (-108.4288, 37.9423) -> (-108.4288, 45.9423)
  line L18 (10.8212, 45.9423) -> (10.8212, 37.9423)
  line L19 (10.8212, 37.9423) -> (11.5712, 37.9423)
  line L20 (11.5712, 37.9423) -> (11.5712, 45.9423)
  line L21 (40, 14.58) -> (40, 25.42) construction
  line L22 (25.42, 40) -> (14.58, 40) construction
  line L23 (-103, 1.5) -> (-103, 0) construction
  line L24 (-48.8038, 50) -> (-48.8038, 0) construction
  line L25 (-63.9171, 50) -> (-58.8038, 20)
  line L26 (-58.8038, 20) -> (-38.8038, 20)
  line L27 (-38.8038, 20) -> (-8.8038, 50)
  circle A6 centre (-53.8038, 10) radius 1.7
  circle A7 centre (-43.8038, 10) radius 1.7
  line L28 (-53.8038, 10) -> (-43.8038, 10) construction
  circle A8 centre (-93, 10) radius 2.75
  circle A9 centre (-73, 30) radius 2.75
  circle A10 centre (10, 10) radius 2.75
  circle A11 centre (30, 30) radius 2.75
  point P0 (0, 0)
  dimension "d154" = 5
  dimension "d155" = 8.15
  dimension "d156" = 0.75
  dimension "d157" = 8
  dimension "d160" = 10
  dimension "d161" = 10
  dimension "d162" = 120
  dimension "d163" = 50
  dimension "d164" = 150
  dimension "d165" = 45
  dimension "d166" = 16
  dimension "d167" = 9
  dimension "d168" = 5
  dimension "d169" = 120
  dimension "d258" = 60
  dimension "d261" = 30
  dimension "d262" = 37
  dimension "d263" = 20
  dimension "d264" = 135
  dimension "d265" = 3.4
  dimension "d266" = 3.4
  dimension "d267" = 10
  dimension "d268" = 10
  dimension "d274" = 5.5
extrude "base" add sketch "Sketch2" against normal blind 12 contours L11 L10 L9 L8 L7 L6 L25 L26 L27 L5 L4 L3 L2 L1 L0
sketch "Sketch13" plane through (0, 0, -12) normal (0, 0, -1) x (-1, 0, 0)
  arc A0 (-10.8212, 45.9423) -> (-11.5712, 45.9423) centre (-11.1962, 50) ccw projected
  line L0 (-10.8212, 45.9423) -> (-10.8212, 37.9423) projected
  line L1 (-11.5712, 37.9423) -> (-11.5712, 45.9423) projected
  line L2 (-10.8212, 37.9423) -> (-11.5712, 37.9423) projected
  arc A1 (109.1788, 45.9423) -> (108.4288, 45.9423) centre (108.8038, 50) ccw projected
  line L3 (109.1788, 45.9423) -> (109.1788, 37.9423) projected
  line L4 (108.4288, 37.9423) -> (108.4288, 45.9423) projected
  line L5 (109.1788, 37.9423) -> (108.4288, 37.9423) projected
  point P0 (0, 0)
extrude "rod_fills" add sketch "Sketch13" against normal blind 2
sketch "Sketch14" plane through (0, 0, 0) normal (0, 0, 1) x (1, 0, 0)
  circle A0 centre (-53.8038, 10) radius 1.7 projected
  line L0 (-50.3397, 10) -> (-52.0718, 7)
  line L1 (-52.0718, 7) -> (-55.5359, 7)
  line L2 (-55.5359, 7) -> (-57.2679, 10)
  line L3 (-57.2679, 10) -> (-55.5359, 13)
  line L4 (-55.5359, 13) -> (-52.0718, 13)
  line L5 (-52.0718, 13) -> (-50.3397, 10)
  circle A1 centre (-43.8038, 10) radius 1.7 projected
  line L6 (-42.0718, 13) -> (-40.3397, 10)
  line L7 (-40.3397, 10) -> (-42.0718, 7)
  line L8 (-42.0718, 7) -> (-45.5359, 7)
  line L9 (-45.5359, 7) -> (-47.2679, 10)
  line L10 (-47.2679, 10) -> (-45.5359, 13)
  line L11 (-45.5359, 13) -> (-42.0718, 13)
  point P0 (0, 0)
  dimension "d270" = 6
  dimension "d271" = 6
extrude "Extrusion10" cut sketch "Sketch14" against normal blind 3 contours A0 | L0 L1 L2 L3 L4 L5 | A1 | L6 L7 L8 L9 L10 L11
chamfer "Chamfer10" distance 1 angle 45 15 edges at (37.4282, 40, -12) (50, 20, -12) (20.5263, 47.5, -12) (11.1962, 55, -12) (4.7528, 52.5, -12) (-2.7472, 50, -12) (-23.8038, 35, -12) (-48.8038, 20, -12) (-61.3605, 35, -12) (-82.4171, 50, -12) (-102.3605, 52.5, -12) (-108.8038, 55, -12) (-116.4019, 50.5, -12) (-119, 31, -12) (-111, 8, -12)
properties part number "_3DPrint"
